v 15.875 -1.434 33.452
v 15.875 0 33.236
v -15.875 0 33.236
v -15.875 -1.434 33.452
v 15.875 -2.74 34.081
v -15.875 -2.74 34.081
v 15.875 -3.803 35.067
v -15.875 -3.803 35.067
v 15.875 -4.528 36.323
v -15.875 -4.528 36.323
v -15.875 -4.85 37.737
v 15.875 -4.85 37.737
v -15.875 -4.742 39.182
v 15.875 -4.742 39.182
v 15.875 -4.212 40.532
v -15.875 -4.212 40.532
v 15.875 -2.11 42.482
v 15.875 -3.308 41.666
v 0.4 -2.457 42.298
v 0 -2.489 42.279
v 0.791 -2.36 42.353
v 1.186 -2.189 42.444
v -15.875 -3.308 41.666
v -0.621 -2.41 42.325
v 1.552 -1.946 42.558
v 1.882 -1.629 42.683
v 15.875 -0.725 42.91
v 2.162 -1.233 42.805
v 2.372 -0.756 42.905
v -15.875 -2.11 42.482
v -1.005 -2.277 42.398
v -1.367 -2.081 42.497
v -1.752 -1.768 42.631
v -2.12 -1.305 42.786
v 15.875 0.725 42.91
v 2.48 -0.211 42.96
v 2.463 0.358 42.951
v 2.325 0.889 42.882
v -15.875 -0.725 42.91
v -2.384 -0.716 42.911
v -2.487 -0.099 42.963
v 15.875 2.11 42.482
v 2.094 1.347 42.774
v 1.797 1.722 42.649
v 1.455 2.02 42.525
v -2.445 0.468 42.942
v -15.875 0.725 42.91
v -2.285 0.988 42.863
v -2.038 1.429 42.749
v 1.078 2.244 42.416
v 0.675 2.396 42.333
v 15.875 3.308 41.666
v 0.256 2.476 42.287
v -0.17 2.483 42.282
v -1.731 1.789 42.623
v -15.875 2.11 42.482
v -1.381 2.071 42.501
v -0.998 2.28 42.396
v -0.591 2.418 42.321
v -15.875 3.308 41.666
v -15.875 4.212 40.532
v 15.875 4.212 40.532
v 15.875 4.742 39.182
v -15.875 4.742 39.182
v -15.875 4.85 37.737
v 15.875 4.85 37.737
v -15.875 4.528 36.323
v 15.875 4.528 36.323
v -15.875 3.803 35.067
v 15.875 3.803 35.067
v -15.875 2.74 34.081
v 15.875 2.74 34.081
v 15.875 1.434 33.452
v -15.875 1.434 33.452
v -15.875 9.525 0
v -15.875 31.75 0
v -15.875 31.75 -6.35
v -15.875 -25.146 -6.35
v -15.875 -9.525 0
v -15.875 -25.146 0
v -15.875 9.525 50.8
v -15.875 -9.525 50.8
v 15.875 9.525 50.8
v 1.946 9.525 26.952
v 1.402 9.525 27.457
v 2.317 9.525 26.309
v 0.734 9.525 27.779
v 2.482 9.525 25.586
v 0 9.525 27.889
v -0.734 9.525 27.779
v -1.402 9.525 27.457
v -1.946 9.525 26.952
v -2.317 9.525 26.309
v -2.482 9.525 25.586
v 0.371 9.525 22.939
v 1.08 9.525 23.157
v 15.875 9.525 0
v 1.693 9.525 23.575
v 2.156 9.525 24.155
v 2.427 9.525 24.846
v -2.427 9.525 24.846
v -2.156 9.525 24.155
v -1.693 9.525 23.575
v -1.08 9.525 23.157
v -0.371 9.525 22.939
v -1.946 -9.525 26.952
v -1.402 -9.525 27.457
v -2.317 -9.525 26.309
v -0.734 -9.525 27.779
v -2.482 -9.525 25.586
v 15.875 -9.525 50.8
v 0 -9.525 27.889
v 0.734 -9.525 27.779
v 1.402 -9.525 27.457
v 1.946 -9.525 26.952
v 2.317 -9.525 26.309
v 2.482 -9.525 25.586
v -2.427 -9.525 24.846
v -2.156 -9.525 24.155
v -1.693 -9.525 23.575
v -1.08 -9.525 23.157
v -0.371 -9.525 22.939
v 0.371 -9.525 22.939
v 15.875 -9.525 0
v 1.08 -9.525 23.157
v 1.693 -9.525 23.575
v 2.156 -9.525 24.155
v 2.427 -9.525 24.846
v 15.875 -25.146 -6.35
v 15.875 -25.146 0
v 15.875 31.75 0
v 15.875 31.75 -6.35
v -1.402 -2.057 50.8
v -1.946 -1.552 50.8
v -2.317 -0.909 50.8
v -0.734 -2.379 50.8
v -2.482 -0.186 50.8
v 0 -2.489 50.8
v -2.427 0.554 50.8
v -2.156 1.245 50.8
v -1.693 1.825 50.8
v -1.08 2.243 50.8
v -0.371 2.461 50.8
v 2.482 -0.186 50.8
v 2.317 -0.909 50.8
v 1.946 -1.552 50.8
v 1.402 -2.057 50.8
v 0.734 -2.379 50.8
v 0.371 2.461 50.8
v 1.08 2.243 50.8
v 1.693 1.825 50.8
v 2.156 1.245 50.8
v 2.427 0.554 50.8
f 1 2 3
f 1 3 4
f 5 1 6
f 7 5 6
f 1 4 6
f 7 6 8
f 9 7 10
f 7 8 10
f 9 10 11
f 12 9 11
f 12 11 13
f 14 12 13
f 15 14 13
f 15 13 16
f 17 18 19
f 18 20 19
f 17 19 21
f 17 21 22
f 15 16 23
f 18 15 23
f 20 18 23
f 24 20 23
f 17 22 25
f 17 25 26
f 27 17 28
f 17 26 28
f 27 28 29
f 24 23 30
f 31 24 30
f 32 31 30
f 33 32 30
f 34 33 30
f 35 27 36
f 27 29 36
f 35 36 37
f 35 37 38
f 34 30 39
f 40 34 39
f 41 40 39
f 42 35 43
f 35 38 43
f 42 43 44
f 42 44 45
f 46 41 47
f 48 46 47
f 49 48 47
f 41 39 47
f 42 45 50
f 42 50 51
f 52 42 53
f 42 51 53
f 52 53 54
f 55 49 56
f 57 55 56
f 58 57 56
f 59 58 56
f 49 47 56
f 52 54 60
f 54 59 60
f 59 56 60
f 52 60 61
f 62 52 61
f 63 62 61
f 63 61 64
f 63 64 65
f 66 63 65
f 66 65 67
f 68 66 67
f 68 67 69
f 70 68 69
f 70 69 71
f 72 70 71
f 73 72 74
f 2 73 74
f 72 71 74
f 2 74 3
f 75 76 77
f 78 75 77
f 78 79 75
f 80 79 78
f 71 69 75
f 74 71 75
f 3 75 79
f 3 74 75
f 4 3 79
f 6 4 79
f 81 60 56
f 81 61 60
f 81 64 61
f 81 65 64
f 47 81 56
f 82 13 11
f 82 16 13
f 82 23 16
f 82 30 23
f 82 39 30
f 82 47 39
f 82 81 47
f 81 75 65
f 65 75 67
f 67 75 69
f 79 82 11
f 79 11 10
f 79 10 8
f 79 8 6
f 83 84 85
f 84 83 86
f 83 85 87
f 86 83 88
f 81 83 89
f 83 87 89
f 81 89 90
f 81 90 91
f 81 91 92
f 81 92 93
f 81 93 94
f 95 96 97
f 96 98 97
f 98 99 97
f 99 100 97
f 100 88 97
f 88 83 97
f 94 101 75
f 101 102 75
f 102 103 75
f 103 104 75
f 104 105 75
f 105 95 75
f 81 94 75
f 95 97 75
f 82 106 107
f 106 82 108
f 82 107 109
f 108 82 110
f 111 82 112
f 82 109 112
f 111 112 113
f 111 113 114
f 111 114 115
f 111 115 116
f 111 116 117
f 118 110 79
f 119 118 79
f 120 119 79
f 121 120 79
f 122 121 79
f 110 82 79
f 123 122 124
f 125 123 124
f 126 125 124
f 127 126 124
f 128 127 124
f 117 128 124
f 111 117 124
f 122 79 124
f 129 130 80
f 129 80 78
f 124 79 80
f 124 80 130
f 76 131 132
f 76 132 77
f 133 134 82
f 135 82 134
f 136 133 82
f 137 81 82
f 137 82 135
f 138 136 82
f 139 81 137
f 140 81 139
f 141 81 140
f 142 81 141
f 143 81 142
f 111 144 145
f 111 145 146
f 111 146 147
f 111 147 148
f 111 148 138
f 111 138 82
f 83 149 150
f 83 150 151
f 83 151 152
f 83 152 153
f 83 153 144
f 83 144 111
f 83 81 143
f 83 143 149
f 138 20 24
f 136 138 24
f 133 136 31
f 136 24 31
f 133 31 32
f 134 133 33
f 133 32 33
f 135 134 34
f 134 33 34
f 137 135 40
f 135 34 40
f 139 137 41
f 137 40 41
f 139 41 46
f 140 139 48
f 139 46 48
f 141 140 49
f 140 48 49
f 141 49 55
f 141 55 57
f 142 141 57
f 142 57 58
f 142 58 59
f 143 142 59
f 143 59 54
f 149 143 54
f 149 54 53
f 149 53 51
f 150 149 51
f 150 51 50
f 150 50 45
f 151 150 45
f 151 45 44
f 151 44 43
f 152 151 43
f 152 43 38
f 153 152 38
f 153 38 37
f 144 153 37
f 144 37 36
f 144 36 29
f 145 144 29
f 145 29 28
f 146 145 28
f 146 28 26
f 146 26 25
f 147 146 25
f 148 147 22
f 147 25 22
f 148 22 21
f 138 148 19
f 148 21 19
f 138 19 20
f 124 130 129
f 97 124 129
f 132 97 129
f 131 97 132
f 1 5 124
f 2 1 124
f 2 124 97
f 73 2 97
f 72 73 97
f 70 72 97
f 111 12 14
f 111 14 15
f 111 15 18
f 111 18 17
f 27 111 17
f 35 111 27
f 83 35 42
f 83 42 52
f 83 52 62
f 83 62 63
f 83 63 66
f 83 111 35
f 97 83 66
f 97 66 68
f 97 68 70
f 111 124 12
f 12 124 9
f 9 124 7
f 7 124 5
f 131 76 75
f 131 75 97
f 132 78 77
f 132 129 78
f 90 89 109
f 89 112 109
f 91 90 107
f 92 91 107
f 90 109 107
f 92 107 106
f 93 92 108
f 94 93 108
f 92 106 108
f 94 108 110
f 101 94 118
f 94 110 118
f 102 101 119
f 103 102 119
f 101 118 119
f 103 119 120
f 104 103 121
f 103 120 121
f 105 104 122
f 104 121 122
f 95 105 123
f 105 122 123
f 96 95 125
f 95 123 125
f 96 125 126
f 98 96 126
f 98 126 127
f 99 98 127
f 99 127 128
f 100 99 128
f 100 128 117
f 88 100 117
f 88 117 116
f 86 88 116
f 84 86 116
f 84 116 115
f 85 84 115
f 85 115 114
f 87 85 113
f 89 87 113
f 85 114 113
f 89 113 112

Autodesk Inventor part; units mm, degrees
ref_plane "YZ Plane" through (0, 0, 0) normal (1, 0, 0) x (0, 1, 0)
ref_plane "XZ Plane" through (0, 0, 0) normal (0, 1, 0) x (-1, 0, 0)
ref_plane "XY Plane" through (0, 0, 0) normal (0, 0, 1) x (1, 0, 0)
sketch "Sketch1" plane through (0, 0, 0) normal (0, 0, 1) x (1, 0, 0)
  line L0 (-15.875, -31.75) -> (15.875, -31.75)
  line L1 (15.875, -31.75) -> (15.875, 31.75)
  line L2 (15.875, 31.75) -> (-15.875, 31.75)
  line L3 (-15.875, 31.75) -> (-15.875, -31.75)
  line L4 (-15.875, -31.75) -> (15.875, 31.75) construction
  line L5 (15.875, -31.75) -> (-15.875, 31.75) construction
  point P0 (0, 0)
  dimension "height" = 63.5
  dimension "width" = 31.75
extrude "Extrusion1" add sketch "Sketch1" against normal blind 12.7
sketch "Sketch3" plane through (0, 0, 0) normal (0, 0, 1) x (1, 0, 0)
  line L0 (-15.875, -9.525) -> (15.875, -9.525)
  line L1 (15.875, -9.525) -> (15.875, 9.525)
  line L2 (15.875, 9.525) -> (-15.875, 9.525)
  line L3 (-15.875, 9.525) -> (-15.875, -9.525)
  line L4 (-15.875, -9.525) -> (15.875, 9.525) construction
  line L5 (15.875, -9.525) -> (-15.875, 9.525) construction
  line L6 (15.875, 31.75) -> (-15.875, 31.75) projected
  point P0 (0, 0)
  dimension "Channel_Width" = 19.05
  dimension "d52" = 31.75
extrude "Extrusion3" add sketch "Sketch3" along normal blind 50.8
sketch "Sketch6" plane through (15.875, -31.75, -12.7) normal (1, 0, 0) x (0, 0, -1)
  line L0 (-12.7, 31.75) -> (-63.5, 31.75) construction
  line L1 (-63.5, 22.225) -> (-63.5, 41.275) construction
  line L2 (-12.7, 41.275) -> (-12.7, 63.5) construction
  point P0 (-50.8, 31.75)
  dimension "d53" = 38.1
hole "Hole5" at (15.875, 0, 38.1) direction (-1, 0, 0) diameter 9.7282 end through all thread size "7/16-20 UNF" class "2B" standard "ANSI Unified Screw Threads"
sketch "Sketch13" plane through (15.875, -31.75, -12.7) normal (1, 0, 0) x (0, 0, -1)
  line L0 (-12.7, 63.5) -> (0, 63.5) projected
  line L1 (0, 0) -> (-6.35, 0)
  line L2 (-6.35, 0) -> (-6.35, 63.5)
  line L3 (-6.35, 63.5) -> (0, 63.5)
  line L4 (0, 63.5) -> (0, 0)
  point P0 (-12.7, 31.75)
  dimension "d98" = 6.35
extrude "Extrusion5" cut sketch "Sketch13" against normal through all
sketch "Sketch14" plane through (-15.875, -31.75, 0) normal (-1, 0, 0) x (0, 0, 1)
  line L0 (0, 0) -> (-6.35, 0) projected
  line L1 (0, 0) -> (0, 22.225) projected
  line L2 (-6.35, 0) -> (0, 0)
  line L3 (0, 0) -> (0, 6.604)
  line L4 (0, 6.604) -> (-6.35, 6.604)
  line L5 (-6.35, 6.604) -> (-6.35, 0)
  point P0 (0, 31.75)
  dimension "d101" = 6.604
extrude "Extrusion6" cut sketch "Sketch14" against normal through all
sketch "Sketch15" plane through (-15.875, 9.525, 0) normal (0, 1, 0) x (1, 0, 0)
  line L0 (31.75, -50.8) -> (0, -50.8) projected
  point P0 (15.875, 0)
  point P1 (15.875, -25.4)
  dimension "d104" = 25.4
hole "Hole11" at (0, 9.525, 25.4) direction (0, -1, 0) diameter 4.9784 end through all thread size "1/4-20 UNC" class "2B" standard "ANSI Unified Screw Threads"
sketch "Sketch11" plane through (0, 0, 50.8) normal (0, 0, 1) x (1, 0, 0)
  point P0 (0, 0)
hole "Hole12" at (0, 0, 50.8) direction (0, 0, -1) diameter 4.9784 depth 12.7 tip angle 118 thread size "1/4-20 UNC" class "2B" standard "ANSI Unified Screw Threads"
sketch "Sketch10" plane through (0, 0, 50.8) normal (0, 0, 1) x (1, 0, 0)
  point P0 (0, 0)
sketch "Sketch12" plane through (-15.875, -9.525, 0) normal (0, -1, 0) x (1, 0, 0)
  point P0 (15.875, 15.875)
equation "\"d52\" = width"
properties part number "Support For Arms" material "Aluminum 6061"
